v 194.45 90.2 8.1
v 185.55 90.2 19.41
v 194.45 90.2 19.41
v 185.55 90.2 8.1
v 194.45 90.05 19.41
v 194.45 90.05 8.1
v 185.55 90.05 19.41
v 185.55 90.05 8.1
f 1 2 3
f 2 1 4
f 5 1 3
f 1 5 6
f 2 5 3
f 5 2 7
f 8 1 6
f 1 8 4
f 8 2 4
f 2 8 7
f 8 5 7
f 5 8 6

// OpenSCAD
boxes=[["J14", 185.55, 85.05000000000001, 8.1, 8.899999999999977, 4.899999999999977, 11.31], ["J15", 185.55, 90.05000000000001, 8.1, 8.899999999999977, 4.899999999999977, 11.31]];
module box(b,m=0){translate([b[1]-m,b[2]-m,b[3]-m])cube([b[4]+2*m,b[5]+2*m,b[6]+2*m]);}
intersection(){box(boxes[0],.25);box(boxes[1]);}
